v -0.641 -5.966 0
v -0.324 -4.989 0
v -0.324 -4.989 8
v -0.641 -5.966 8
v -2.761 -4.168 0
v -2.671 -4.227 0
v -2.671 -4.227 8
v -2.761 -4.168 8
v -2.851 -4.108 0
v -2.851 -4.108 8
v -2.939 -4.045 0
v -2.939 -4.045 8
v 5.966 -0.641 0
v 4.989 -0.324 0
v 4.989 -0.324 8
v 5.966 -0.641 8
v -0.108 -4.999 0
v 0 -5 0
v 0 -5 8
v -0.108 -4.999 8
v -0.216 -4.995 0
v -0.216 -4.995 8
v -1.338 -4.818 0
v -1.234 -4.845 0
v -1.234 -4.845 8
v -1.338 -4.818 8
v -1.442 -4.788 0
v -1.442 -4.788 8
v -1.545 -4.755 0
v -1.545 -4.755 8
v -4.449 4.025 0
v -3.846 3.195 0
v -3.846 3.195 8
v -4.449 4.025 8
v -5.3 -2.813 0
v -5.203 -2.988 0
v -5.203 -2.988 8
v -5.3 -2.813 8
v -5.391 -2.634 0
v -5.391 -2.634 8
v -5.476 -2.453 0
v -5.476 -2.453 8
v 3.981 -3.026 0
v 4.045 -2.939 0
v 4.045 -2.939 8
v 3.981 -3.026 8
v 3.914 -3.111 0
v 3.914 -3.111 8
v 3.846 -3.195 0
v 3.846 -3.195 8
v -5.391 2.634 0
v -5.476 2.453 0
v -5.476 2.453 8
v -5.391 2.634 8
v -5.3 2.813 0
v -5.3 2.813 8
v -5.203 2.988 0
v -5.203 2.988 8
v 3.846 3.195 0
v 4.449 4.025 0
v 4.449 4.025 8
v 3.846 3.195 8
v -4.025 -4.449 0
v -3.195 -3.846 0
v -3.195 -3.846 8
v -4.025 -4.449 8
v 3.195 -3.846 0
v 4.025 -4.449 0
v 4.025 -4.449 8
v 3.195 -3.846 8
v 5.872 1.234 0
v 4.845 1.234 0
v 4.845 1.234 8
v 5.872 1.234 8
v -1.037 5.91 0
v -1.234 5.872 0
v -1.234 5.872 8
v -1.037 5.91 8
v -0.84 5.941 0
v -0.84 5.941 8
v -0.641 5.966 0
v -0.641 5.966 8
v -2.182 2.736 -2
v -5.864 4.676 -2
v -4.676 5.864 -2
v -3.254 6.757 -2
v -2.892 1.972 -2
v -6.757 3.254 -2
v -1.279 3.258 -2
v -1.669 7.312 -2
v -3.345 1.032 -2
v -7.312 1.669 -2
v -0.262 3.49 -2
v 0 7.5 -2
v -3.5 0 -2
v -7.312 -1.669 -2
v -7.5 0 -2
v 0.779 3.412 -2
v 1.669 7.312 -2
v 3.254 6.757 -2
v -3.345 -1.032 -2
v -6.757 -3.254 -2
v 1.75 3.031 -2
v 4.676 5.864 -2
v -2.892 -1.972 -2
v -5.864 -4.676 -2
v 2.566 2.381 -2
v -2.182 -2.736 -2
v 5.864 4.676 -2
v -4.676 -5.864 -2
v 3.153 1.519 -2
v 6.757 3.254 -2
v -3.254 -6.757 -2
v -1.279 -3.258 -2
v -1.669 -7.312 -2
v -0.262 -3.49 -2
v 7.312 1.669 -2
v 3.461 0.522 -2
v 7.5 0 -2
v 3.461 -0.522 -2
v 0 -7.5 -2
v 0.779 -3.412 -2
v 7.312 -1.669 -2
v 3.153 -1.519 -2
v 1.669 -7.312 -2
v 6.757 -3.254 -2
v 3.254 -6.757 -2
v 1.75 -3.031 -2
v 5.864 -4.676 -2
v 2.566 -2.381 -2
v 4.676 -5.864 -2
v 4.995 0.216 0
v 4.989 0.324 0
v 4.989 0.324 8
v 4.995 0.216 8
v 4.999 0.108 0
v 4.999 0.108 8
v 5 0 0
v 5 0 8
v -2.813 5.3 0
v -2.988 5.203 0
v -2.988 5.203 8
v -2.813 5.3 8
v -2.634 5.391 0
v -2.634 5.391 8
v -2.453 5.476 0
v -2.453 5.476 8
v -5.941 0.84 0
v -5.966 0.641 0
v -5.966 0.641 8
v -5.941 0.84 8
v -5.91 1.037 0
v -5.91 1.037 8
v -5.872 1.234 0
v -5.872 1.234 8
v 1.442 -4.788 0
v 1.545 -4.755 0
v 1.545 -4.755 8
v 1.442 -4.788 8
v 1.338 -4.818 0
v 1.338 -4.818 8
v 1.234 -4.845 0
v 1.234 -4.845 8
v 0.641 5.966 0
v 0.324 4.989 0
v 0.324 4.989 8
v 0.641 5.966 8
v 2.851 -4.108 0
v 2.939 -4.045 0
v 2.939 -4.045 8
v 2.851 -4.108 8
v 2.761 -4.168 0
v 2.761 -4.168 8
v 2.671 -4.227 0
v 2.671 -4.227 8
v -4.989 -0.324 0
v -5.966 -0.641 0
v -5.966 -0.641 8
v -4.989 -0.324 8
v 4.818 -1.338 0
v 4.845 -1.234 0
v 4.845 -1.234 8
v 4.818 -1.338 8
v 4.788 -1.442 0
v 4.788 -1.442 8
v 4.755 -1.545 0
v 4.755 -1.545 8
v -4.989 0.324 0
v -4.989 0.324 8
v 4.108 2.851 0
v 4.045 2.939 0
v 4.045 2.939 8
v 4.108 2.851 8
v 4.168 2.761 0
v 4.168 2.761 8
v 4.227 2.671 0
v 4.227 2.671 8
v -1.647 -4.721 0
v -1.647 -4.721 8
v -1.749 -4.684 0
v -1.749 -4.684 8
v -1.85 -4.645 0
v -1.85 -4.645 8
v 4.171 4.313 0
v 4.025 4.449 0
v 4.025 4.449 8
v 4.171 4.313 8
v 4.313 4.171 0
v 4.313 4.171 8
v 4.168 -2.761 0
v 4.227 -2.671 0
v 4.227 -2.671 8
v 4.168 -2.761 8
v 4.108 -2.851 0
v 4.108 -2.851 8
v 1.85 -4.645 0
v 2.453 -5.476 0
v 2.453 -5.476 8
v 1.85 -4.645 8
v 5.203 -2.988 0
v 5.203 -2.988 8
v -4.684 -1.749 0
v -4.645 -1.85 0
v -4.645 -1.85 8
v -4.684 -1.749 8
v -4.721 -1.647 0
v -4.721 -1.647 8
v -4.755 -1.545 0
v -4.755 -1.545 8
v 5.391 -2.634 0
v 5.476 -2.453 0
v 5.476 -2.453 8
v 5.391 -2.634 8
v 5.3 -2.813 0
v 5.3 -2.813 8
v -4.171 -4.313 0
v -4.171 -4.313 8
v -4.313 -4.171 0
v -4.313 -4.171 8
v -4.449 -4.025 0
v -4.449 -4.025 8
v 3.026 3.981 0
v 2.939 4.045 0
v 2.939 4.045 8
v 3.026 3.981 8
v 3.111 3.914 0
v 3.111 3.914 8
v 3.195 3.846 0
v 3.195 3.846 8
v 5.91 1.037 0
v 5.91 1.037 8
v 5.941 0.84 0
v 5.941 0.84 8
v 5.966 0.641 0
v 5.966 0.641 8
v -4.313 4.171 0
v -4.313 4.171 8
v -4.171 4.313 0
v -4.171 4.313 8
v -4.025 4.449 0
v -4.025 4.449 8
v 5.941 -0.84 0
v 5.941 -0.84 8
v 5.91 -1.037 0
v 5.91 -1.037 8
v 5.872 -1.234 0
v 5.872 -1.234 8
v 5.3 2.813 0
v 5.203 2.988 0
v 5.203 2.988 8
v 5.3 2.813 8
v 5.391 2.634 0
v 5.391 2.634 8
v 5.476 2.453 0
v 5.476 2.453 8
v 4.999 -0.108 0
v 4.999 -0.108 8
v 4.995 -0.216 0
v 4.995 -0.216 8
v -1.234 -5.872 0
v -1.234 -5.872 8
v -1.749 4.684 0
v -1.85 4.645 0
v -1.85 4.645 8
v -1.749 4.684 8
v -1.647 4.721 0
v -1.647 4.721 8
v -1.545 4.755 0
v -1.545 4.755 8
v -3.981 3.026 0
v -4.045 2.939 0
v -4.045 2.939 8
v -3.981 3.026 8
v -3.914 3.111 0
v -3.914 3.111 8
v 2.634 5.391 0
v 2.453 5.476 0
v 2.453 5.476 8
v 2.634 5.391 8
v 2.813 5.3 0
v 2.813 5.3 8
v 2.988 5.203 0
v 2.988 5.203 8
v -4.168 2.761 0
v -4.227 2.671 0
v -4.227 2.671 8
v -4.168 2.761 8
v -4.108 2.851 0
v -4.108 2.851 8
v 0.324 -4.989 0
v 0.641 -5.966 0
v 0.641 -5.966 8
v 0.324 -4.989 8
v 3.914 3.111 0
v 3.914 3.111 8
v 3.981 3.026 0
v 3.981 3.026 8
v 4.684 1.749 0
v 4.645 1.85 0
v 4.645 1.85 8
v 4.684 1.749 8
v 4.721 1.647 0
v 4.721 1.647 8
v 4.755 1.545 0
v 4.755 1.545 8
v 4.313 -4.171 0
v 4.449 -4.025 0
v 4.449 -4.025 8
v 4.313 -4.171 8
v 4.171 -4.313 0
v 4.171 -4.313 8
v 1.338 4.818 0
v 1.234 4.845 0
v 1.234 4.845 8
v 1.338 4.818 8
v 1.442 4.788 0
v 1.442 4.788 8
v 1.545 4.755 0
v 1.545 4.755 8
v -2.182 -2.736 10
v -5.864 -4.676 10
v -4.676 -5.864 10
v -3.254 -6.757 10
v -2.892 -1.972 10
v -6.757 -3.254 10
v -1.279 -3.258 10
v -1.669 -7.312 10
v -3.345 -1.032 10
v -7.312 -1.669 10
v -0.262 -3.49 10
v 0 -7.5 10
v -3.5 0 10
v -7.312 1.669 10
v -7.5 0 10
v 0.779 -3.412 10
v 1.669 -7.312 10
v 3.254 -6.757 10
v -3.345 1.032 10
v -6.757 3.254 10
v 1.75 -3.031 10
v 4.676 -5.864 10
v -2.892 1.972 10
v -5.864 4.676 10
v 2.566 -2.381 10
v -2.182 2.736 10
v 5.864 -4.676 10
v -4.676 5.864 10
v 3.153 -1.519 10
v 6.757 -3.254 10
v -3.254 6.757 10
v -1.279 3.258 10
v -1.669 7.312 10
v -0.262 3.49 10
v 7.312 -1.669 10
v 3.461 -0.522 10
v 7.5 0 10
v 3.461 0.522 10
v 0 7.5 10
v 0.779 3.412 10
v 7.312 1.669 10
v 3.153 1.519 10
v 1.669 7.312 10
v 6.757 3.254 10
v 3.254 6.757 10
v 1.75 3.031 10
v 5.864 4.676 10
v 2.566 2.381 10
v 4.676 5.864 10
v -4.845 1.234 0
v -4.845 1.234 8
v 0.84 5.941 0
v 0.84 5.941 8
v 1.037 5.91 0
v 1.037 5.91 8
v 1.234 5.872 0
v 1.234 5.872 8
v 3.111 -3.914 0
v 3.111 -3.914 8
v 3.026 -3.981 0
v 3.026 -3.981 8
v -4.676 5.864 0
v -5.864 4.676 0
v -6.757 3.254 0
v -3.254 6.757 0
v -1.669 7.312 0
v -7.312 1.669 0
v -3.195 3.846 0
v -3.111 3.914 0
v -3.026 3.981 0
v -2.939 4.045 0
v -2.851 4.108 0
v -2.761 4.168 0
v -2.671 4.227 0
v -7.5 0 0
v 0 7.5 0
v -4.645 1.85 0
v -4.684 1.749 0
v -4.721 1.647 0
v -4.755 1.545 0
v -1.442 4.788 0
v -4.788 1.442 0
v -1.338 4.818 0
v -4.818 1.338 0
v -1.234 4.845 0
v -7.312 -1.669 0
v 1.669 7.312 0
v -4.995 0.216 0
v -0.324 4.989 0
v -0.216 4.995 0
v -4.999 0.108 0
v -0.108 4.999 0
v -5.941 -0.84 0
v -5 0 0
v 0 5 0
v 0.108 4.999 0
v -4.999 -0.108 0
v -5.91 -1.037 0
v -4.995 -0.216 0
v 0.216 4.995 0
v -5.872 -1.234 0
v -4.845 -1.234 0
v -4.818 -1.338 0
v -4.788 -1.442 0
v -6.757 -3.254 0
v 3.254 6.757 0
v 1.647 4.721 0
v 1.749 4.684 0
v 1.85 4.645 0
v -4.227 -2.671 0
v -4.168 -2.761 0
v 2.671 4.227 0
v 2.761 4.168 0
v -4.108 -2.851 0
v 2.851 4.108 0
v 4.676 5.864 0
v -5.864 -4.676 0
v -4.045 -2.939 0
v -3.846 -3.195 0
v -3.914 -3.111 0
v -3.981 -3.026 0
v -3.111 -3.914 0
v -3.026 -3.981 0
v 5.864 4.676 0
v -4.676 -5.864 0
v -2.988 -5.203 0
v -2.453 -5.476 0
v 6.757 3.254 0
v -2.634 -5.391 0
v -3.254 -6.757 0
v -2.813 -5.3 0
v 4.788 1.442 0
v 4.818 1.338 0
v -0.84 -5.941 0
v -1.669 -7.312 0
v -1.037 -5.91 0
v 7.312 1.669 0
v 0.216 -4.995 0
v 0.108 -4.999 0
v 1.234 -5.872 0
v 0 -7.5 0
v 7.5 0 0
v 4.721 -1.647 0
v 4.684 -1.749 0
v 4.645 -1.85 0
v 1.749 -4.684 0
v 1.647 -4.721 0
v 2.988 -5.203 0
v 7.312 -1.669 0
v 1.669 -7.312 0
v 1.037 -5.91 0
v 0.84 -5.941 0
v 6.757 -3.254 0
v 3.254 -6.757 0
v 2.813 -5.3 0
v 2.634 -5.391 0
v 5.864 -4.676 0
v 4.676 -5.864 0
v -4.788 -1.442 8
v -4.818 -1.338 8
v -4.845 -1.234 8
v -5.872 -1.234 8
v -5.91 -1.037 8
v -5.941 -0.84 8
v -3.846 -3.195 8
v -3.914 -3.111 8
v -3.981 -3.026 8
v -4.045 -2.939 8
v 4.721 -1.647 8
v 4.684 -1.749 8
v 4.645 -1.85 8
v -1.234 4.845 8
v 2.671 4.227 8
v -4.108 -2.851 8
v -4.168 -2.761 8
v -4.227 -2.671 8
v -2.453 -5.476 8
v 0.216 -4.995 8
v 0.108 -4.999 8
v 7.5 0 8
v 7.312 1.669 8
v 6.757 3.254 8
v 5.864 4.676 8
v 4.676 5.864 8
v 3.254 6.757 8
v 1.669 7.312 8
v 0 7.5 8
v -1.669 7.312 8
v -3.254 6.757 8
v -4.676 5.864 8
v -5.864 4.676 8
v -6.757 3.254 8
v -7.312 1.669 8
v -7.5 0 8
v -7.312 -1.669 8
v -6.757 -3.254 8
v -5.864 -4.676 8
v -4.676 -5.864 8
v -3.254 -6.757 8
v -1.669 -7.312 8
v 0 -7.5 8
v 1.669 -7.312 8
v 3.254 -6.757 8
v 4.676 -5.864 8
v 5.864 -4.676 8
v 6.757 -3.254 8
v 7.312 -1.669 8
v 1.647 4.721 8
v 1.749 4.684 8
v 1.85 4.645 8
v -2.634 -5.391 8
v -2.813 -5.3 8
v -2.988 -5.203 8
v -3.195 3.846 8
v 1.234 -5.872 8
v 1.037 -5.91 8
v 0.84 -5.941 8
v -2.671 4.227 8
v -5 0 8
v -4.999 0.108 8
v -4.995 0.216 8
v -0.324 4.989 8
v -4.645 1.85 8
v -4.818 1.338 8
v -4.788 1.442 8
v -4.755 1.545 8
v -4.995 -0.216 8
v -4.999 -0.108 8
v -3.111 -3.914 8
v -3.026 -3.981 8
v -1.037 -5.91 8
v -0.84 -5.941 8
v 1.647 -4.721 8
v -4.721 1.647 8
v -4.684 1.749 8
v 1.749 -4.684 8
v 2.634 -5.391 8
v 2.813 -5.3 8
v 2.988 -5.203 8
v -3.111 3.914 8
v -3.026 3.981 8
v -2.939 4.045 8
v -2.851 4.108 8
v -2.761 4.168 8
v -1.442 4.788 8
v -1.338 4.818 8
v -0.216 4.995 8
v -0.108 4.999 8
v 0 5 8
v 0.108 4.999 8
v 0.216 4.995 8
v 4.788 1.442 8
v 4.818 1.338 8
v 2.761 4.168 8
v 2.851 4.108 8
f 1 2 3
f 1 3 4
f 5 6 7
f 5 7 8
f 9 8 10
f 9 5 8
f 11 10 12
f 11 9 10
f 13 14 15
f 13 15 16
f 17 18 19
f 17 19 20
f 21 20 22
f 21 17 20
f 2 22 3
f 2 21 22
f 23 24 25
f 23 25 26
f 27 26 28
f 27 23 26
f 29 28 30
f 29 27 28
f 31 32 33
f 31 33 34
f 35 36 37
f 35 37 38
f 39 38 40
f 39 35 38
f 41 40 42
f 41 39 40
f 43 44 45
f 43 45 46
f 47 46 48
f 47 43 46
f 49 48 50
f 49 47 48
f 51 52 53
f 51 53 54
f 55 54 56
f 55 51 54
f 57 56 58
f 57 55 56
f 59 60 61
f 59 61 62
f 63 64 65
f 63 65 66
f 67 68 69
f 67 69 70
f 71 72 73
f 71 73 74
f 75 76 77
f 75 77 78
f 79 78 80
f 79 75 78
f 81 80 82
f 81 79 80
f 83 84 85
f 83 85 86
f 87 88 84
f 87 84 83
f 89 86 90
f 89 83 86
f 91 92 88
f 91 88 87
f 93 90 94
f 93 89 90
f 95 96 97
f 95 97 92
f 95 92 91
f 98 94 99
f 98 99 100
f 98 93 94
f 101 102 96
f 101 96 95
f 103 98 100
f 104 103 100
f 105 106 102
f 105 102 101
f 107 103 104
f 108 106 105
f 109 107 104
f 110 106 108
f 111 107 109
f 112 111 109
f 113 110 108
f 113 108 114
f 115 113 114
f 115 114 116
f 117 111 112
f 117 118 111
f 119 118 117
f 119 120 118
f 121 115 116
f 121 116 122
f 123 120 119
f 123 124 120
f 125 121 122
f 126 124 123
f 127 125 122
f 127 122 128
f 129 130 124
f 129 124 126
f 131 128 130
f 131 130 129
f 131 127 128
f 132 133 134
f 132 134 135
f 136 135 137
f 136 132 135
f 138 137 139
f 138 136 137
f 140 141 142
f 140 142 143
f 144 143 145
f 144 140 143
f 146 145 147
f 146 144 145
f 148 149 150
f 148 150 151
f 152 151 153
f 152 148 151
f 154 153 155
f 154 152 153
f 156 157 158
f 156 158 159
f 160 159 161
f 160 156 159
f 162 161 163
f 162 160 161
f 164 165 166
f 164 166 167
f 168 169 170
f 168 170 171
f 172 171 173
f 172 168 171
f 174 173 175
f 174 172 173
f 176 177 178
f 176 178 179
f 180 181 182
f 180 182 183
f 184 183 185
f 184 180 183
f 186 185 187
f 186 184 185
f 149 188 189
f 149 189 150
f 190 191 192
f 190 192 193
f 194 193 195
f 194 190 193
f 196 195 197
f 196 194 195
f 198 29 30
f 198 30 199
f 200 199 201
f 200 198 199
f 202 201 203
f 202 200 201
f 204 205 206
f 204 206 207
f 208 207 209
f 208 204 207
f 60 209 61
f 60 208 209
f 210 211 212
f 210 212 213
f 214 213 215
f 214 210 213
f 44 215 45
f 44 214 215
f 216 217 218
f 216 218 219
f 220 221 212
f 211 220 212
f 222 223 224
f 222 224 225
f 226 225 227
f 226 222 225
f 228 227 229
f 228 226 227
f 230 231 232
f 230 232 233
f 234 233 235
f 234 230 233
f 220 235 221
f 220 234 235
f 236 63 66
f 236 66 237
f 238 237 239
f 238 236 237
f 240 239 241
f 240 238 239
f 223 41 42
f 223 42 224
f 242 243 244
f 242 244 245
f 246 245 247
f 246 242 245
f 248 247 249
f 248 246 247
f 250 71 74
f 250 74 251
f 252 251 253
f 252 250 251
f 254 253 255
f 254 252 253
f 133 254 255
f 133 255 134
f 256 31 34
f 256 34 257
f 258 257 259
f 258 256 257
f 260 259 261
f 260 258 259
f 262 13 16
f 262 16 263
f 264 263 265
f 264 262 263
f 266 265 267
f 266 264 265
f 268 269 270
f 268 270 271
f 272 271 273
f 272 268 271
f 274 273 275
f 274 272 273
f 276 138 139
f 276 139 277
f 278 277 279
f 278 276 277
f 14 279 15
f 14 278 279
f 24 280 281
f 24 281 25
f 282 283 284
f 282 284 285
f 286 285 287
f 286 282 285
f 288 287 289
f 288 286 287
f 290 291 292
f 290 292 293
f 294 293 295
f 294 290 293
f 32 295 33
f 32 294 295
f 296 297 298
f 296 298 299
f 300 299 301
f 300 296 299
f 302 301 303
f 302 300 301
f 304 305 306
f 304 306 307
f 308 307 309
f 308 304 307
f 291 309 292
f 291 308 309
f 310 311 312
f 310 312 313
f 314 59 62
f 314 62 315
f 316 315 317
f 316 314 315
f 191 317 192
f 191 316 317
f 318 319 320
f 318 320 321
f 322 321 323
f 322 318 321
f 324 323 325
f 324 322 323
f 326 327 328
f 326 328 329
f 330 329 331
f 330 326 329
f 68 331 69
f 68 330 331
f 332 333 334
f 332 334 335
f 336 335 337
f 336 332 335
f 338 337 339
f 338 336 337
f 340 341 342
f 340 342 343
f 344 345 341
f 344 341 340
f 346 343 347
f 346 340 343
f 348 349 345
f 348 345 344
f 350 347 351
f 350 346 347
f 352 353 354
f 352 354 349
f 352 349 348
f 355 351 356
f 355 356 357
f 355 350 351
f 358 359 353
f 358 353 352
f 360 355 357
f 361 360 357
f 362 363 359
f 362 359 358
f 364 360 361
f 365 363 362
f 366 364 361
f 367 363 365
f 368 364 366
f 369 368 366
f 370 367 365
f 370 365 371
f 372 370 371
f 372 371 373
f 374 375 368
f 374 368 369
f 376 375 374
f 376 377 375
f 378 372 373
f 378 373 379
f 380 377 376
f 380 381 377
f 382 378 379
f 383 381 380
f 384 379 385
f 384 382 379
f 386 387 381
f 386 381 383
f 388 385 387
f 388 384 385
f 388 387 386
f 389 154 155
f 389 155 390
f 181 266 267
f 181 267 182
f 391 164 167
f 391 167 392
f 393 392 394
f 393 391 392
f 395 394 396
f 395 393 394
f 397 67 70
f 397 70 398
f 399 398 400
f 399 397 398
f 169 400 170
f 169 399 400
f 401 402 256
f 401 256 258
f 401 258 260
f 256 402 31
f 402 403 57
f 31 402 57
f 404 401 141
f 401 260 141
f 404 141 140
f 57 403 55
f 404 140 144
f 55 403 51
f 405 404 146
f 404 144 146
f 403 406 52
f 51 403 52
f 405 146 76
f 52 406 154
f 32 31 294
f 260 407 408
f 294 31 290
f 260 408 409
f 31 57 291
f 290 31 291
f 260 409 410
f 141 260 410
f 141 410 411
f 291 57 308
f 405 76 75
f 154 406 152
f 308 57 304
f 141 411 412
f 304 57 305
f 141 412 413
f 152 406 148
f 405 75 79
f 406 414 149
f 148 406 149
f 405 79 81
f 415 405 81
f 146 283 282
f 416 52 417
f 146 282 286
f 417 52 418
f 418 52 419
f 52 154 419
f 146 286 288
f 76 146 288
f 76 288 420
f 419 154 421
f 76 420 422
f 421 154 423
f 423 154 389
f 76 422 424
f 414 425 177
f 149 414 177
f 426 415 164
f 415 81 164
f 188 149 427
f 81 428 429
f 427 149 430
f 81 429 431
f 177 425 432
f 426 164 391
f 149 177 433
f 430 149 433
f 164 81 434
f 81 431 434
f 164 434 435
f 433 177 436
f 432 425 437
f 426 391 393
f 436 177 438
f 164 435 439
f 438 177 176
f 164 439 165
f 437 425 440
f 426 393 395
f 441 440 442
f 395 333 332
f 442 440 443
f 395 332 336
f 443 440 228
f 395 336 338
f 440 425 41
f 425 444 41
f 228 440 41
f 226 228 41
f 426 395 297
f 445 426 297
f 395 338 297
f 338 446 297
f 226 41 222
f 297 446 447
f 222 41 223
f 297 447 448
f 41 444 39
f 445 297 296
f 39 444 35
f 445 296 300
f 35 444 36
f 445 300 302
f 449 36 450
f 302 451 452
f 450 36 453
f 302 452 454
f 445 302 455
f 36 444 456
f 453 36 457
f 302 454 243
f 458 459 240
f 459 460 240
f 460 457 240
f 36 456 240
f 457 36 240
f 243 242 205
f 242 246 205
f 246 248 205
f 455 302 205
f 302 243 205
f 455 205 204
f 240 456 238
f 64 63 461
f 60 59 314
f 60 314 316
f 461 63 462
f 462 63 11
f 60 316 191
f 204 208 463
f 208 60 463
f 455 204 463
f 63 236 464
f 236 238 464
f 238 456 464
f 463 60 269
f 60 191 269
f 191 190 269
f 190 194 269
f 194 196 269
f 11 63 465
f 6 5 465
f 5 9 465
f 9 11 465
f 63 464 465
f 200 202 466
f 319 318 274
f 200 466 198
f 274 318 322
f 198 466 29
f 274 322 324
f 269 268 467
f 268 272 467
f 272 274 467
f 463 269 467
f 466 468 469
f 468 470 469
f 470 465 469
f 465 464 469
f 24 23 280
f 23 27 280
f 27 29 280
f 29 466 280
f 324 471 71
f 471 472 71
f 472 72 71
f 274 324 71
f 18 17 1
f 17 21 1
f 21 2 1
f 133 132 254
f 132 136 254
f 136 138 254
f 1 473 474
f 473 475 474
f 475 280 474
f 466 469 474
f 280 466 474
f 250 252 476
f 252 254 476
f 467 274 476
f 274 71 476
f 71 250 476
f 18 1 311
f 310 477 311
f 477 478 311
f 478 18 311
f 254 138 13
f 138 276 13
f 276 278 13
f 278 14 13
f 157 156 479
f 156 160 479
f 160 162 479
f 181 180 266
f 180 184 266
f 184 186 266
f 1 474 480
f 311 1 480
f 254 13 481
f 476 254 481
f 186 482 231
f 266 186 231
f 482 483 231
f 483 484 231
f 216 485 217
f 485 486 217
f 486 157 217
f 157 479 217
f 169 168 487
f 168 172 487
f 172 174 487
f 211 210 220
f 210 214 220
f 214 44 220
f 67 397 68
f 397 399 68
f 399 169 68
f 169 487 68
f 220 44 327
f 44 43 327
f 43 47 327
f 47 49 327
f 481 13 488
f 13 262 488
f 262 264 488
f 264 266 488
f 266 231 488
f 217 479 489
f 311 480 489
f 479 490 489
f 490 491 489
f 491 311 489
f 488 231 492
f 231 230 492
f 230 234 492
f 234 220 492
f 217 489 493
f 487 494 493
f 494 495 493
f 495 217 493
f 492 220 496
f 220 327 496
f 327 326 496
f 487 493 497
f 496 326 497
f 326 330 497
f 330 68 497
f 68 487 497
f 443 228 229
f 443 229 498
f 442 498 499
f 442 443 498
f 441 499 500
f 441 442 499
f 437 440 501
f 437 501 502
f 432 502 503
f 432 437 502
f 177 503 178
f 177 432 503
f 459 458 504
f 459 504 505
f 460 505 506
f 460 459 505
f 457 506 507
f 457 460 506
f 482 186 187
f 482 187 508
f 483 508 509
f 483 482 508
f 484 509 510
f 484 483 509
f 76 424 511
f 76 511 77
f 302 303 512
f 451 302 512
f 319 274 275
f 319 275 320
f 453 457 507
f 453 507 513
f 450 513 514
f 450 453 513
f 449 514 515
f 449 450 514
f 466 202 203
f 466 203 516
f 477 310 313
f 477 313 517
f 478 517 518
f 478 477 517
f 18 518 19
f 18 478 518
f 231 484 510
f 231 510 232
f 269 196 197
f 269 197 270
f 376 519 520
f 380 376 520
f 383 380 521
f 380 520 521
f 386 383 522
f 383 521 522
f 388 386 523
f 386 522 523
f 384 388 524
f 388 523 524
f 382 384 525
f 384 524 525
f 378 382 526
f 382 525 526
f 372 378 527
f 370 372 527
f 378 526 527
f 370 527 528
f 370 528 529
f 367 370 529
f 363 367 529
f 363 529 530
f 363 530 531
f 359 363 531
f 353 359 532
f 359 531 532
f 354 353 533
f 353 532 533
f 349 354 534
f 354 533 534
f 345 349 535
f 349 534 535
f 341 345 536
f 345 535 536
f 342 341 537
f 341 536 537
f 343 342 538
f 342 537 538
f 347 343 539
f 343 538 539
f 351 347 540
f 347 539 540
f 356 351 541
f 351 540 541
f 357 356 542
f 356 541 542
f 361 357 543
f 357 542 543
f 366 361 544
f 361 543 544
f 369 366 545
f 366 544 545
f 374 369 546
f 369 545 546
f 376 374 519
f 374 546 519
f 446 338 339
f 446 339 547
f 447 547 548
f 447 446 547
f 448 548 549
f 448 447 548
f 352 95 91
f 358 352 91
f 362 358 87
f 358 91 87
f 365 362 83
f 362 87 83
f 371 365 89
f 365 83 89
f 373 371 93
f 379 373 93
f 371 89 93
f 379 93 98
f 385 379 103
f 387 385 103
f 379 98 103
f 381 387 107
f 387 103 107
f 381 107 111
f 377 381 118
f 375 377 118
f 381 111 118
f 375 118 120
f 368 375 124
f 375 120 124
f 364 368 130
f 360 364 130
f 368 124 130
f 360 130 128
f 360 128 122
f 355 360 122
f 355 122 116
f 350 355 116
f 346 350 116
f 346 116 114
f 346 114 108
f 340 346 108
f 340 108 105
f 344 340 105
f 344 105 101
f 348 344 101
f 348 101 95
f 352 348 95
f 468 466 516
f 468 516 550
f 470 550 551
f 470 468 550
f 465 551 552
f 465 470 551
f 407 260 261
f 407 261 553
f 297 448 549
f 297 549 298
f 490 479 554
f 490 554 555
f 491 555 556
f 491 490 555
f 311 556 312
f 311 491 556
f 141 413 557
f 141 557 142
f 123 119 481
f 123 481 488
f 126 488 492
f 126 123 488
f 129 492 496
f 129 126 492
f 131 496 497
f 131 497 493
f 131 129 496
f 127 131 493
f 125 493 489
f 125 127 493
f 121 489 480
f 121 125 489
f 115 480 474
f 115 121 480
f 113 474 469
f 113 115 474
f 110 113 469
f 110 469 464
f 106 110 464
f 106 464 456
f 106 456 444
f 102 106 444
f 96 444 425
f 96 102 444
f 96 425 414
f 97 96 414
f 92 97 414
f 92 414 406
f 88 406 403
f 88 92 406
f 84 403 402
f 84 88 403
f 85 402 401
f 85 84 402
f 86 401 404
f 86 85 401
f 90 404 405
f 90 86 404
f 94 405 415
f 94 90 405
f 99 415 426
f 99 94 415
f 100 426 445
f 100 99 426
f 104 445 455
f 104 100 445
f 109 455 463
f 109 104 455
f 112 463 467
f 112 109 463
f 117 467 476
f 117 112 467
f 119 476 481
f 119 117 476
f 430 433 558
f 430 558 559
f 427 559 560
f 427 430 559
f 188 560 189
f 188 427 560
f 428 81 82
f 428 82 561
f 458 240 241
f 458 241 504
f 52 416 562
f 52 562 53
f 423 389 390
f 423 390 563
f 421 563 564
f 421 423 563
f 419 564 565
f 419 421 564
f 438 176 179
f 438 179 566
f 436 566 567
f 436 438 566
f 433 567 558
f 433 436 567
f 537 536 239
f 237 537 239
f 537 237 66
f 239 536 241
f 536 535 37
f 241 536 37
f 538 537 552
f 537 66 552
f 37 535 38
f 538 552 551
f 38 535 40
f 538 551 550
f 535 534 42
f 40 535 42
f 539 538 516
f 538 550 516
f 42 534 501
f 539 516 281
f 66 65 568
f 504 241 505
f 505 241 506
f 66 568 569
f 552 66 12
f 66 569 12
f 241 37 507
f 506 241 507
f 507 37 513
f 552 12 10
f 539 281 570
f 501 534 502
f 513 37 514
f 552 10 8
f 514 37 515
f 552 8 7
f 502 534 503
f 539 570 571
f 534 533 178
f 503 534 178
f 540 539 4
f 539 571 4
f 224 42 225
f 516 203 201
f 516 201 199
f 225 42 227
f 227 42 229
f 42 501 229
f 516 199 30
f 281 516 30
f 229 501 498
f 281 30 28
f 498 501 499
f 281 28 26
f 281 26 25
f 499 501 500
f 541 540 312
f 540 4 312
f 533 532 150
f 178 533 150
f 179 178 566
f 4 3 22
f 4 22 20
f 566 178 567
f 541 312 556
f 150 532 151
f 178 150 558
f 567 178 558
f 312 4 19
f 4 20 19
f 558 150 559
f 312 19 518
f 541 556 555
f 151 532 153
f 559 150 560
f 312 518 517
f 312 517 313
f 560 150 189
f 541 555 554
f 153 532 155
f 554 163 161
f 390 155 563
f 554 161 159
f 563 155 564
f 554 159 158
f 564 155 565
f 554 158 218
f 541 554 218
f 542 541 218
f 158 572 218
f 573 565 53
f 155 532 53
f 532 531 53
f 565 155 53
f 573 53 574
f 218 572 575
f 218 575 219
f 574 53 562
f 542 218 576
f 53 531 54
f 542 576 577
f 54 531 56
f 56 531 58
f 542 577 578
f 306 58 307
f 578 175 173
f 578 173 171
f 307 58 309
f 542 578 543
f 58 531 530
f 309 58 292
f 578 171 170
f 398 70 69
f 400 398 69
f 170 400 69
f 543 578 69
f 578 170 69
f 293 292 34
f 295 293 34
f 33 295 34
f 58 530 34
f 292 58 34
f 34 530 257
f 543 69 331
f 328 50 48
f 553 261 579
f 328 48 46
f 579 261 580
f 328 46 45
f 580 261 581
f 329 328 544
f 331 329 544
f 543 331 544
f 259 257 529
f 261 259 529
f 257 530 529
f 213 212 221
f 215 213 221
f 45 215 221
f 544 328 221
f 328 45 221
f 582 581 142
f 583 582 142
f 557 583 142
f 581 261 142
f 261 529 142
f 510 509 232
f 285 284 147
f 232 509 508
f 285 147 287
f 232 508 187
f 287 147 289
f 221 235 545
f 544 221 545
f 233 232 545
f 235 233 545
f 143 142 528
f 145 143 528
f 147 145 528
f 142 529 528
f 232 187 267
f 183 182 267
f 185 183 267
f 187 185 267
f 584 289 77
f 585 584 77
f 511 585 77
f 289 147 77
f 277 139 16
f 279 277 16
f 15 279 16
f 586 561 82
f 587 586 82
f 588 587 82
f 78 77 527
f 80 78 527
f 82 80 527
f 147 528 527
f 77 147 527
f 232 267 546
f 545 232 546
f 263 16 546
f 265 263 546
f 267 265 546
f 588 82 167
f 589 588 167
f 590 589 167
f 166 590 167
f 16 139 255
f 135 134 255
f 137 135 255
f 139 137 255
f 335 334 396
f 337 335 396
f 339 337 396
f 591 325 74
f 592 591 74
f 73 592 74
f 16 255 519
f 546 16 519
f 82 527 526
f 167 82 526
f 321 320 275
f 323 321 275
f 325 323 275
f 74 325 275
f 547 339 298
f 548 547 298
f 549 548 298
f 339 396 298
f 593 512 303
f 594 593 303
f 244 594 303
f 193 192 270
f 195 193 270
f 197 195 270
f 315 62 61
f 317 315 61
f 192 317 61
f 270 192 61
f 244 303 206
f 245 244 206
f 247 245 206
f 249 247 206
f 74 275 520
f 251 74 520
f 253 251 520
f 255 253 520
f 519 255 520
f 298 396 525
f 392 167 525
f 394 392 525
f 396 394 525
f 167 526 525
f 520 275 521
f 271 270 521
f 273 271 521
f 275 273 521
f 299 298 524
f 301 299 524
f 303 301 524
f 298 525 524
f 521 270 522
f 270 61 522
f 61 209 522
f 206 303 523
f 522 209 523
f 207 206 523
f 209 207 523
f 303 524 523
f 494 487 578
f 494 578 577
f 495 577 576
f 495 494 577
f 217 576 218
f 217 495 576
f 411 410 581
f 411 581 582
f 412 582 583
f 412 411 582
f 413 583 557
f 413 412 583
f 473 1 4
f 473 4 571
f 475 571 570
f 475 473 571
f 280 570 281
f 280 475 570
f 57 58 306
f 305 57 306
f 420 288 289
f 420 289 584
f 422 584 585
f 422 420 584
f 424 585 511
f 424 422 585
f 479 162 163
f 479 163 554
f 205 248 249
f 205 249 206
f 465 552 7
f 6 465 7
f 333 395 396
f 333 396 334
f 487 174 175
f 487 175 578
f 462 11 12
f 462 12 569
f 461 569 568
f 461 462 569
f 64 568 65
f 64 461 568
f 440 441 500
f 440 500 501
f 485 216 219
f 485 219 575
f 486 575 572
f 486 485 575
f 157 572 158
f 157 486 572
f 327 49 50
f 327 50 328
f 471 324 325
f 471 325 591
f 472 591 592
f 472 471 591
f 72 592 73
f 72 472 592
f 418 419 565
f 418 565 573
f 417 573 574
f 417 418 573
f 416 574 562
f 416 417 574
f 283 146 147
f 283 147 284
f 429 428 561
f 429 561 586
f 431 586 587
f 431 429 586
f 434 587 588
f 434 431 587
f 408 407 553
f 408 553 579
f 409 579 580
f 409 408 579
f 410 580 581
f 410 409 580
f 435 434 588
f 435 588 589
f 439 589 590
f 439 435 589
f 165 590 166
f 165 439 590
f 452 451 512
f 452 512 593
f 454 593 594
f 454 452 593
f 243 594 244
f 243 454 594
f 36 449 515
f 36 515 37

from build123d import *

# Parameters (mm, degrees)
BOSS_EXTRUDE1_DEPTH = 8
SKETCH3_R           = 7.5
BOSS_EXTRUDE2_DEPTH = 2
BOSS_EXTRUDE3_START = 2
SKETCH4_R           = 7.5
BOSS_EXTRUDE3_DEPTH = 2
SKETCH5_R           = 3.5
CUT_EXTRUDE1_DEPTH  = 17.015617378


with BuildPart() as part:
    # Sketch2 → Boss-Extrude1 (new body)
    with BuildSketch(Plane.XY):
        with BuildLine():
            Line((0.323954703, 4.989494298), (0.641126295, 5.965648085))
            ThreePointArc((0.641126295, 5.965648085), (0.93860679, 5.926130044), (1.2337393, 5.871787406))
            Line((1.2337393, 5.871787406), (1.2337393, 4.845398574))
            ThreePointArc((1.2337393, 4.845398574), (1.390142549, 4.802864114), (1.545084972, 4.755282581))
            ThreePointArc((1.545084972, 4.755282581), (1.698403748, 4.702703978), (1.849937763, 4.645183556))
            Line((1.849937763, 4.645183556), (2.453233982, 5.475549564))
            ThreePointArc((2.453233982, 5.475549564), (2.723942998, 5.346039145), (2.987837896, 5.203155264))
            Line((2.987837896, 5.203155264), (2.670666304, 4.227001478))
            ThreePointArc((2.670666304, 4.227001478), (2.806270762, 4.13821754), (2.938926261, 4.045084972))
            ThreePointArc((2.938926261, 4.045084972), (3.068493401, 3.947701641), (3.194836025, 3.846169883))
            Line((3.194836025, 3.846169883), (4.025202033, 4.449466102))
            ThreePointArc((4.025202033, 4.449466102), (4.242640687, 4.242640687), (4.449466102, 4.025202033))
            Line((4.449466102, 4.025202033), (3.846169883, 3.194836025))
            ThreePointArc((3.846169883, 3.194836025), (3.947701641, 3.068493401), (4.045084972, 2.938926261))
            ThreePointArc((4.045084972, 2.938926261), (4.13821754, 2.806270762), (4.227001478, 2.670666304))
            Line((4.227001478, 2.670666304), (5.203155264, 2.987837896))
            ThreePointArc((5.203155264, 2.987837896), (5.346039145, 2.723942998), (5.475549564, 2.453233982))
            Line((5.475549564, 2.453233982), (4.645183556, 1.849937763))
            ThreePointArc((4.645183556, 1.849937763), (4.702703978, 1.698403748), (4.755282581, 1.545084972))
            ThreePointArc((4.755282581, 1.545084972), (4.802864114, 1.390142549), (4.845398574, 1.2337393))
            Line((4.845398574, 1.2337393), (5.871787406, 1.2337393))
            ThreePointArc((5.871787406, 1.2337393), (5.926130044, 0.93860679), (5.965648085, 0.641126295))
            Line((5.965648085, 0.641126295), (4.989494298, 0.323954703))
            ThreePointArc((4.989494298, 0.323954703), (4.997372884, 0.162062503), (5, 0))
            ThreePointArc((5, 0), (4.997372884, -0.162062503), (4.989494298, -0.323954703))
            Line((4.989494298, -0.323954703), (5.965648085, -0.641126295))
            ThreePointArc((5.965648085, -0.641126295), (5.926130044, -0.93860679), (5.871787406, -1.2337393))
            Line((5.871787406, -1.2337393), (4.845398574, -1.2337393))
            ThreePointArc((4.845398574, -1.2337393), (4.802864114, -1.390142549), (4.755282581, -1.545084972))
            ThreePointArc((4.755282581, -1.545084972), (4.702703978, -1.698403748), (4.645183556, -1.849937763))
            Line((4.645183556, -1.849937763), (5.475549564, -2.453233982))
            ThreePointArc((5.475549564, -2.453233982), (5.346039145, -2.723942998), (5.203155264, -2.987837896))
            Line((5.203155264, -2.987837896), (4.227001478, -2.670666304))
            ThreePointArc((4.227001478, -2.670666304), (4.13821754, -2.806270762), (4.045084972, -2.938926261))
            ThreePointArc((4.045084972, -2.938926261), (3.947701641, -3.068493401), (3.846169883, -3.194836025))
            Line((3.846169883, -3.194836025), (4.449466102, -4.025202033))
            ThreePointArc((4.449466102, -4.025202033), (4.242640687, -4.242640687), (4.025202033, -4.449466102))
            Line((4.025202033, -4.449466102), (3.194836025, -3.846169883))
            ThreePointArc((3.194836025, -3.846169883), (3.068493401, -3.947701641), (2.938926261, -4.045084972))
            ThreePointArc((2.938926261, -4.045084972), (2.806270762, -4.13821754), (2.670666304, -4.227001478))
            Line((2.670666304, -4.227001478), (2.987837896, -5.203155264))
            ThreePointArc((2.987837896, -5.203155264), (2.723942998, -5.346039145), (2.453233982, -5.475549564))
            Line((2.453233982, -5.475549564), (1.849937763, -4.645183556))
            ThreePointArc((1.849937763, -4.645183556), (1.698403748, -4.702703978), (1.545084972, -4.755282581))
            ThreePointArc((1.545084972, -4.755282581), (1.390142549, -4.802864114), (1.2337393, -4.845398574))
            Line((1.2337393, -4.845398574), (1.2337393, -5.871787406))
            ThreePointArc((1.2337393, -5.871787406), (0.93860679, -5.926130044), (0.641126295, -5.965648085))
            Line((0.641126295, -5.965648085), (0.323954703, -4.989494298))
            ThreePointArc((0.323954703, -4.989494298), (0.162062503, -4.997372884), (0, -5))
            ThreePointArc((0, -5), (-0.162062503, -4.997372884), (-0.323954703, -4.989494298))
            Line((-0.323954703, -4.989494298), (-0.641126295, -5.965648085))
            ThreePointArc((-0.641126295, -5.965648085), (-0.93860679, -5.926130044), (-1.2337393, -5.871787406))
            Line((-1.2337393, -5.871787406), (-1.2337393, -4.845398574))
            ThreePointArc((-1.2337393, -4.845398574), (-1.390142549, -4.802864114), (-1.545084972, -4.755282581))
            ThreePointArc((-1.545084972, -4.755282581), (-1.698403748, -4.702703978), (-1.849937763, -4.645183556))
            Line((-1.849937763, -4.645183556), (-2.453233982, -5.475549564))
            ThreePointArc((-2.453233982, -5.475549564), (-2.723942998, -5.346039145), (-2.987837896, -5.203155264))
            Line((-2.987837896, -5.203155264), (-2.670666304, -4.227001478))
            ThreePointArc((-2.670666304, -4.227001478), (-2.806270762, -4.13821754), (-2.938926261, -4.045084972))
            ThreePointArc((-2.938926261, -4.045084972), (-3.068493401, -3.947701641), (-3.194836025, -3.846169883))
            Line((-3.194836025, -3.846169883), (-4.025202033, -4.449466102))
            ThreePointArc((-4.025202033, -4.449466102), (-4.242640687, -4.242640687), (-4.449466102, -4.025202033))
            Line((-4.449466102, -4.025202033), (-3.846169883, -3.194836025))
            ThreePointArc((-3.846169883, -3.194836025), (-3.947701641, -3.068493401), (-4.045084972, -2.938926261))
            ThreePointArc((-4.045084972, -2.938926261), (-4.13821754, -2.806270762), (-4.227001478, -2.670666304))
            Line((-4.227001478, -2.670666304), (-5.203155264, -2.987837896))
            ThreePointArc((-5.203155264, -2.987837896), (-5.346039145, -2.723942998), (-5.475549564, -2.453233982))
            Line((-5.475549564, -2.453233982), (-4.645183556, -1.849937763))
            ThreePointArc((-4.645183556, -1.849937763), (-4.702703978, -1.698403748), (-4.755282581, -1.545084972))
            ThreePointArc((-4.755282581, -1.545084972), (-4.802864114, -1.390142549), (-4.845398574, -1.2337393))
            Line((-4.845398574, -1.2337393), (-5.871787406, -1.2337393))
            ThreePointArc((-5.871787406, -1.2337393), (-5.926130044, -0.93860679), (-5.965648085, -0.641126295))
            Line((-5.965648085, -0.641126295), (-4.989494298, -0.323954703))
            ThreePointArc((-4.989494298, -0.323954703), (-4.997372884, -0.162062503), (-5, 0))
            ThreePointArc((-5, 0), (-4.997372884, 0.162062503), (-4.989494298, 0.323954703))
            Line((-4.989494298, 0.323954703), (-5.965648085, 0.641126295))
            ThreePointArc((-5.965648085, 0.641126295), (-5.926130044, 0.93860679), (-5.871787406, 1.2337393))
            Line((-5.871787406, 1.2337393), (-4.845398574, 1.2337393))
            ThreePointArc((-4.845398574, 1.2337393), (-4.802864114, 1.390142549), (-4.755282581, 1.545084972))
            ThreePointArc((-4.755282581, 1.545084972), (-4.702703978, 1.698403748), (-4.645183556, 1.849937763))
            Line((-4.645183556, 1.849937763), (-5.475549564, 2.453233982))
            ThreePointArc((-5.475549564, 2.453233982), (-5.346039145, 2.723942998), (-5.203155264, 2.987837896))
            Line((-5.203155264, 2.987837896), (-4.227001478, 2.670666304))
            ThreePointArc((-4.227001478, 2.670666304), (-4.13821754, 2.806270762), (-4.045084972, 2.938926261))
            ThreePointArc((-4.045084972, 2.938926261), (-3.947701641, 3.068493401), (-3.846169883, 3.194836025))
            Line((-3.846169883, 3.194836025), (-4.449466102, 4.025202033))
            ThreePointArc((-4.449466102, 4.025202033), (-4.242640687, 4.242640687), (-4.025202033, 4.449466102))
            Line((-4.025202033, 4.449466102), (-3.194836025, 3.846169883))
            ThreePointArc((-3.194836025, 3.846169883), (-3.068493401, 3.947701641), (-2.938926261, 4.045084972))
            ThreePointArc((-2.938926261, 4.045084972), (-2.806270762, 4.13821754), (-2.670666304, 4.227001478))
            Line((-2.670666304, 4.227001478), (-2.987837896, 5.203155264))
            ThreePointArc((-2.987837896, 5.203155264), (-2.723942998, 5.346039145), (-2.453233982, 5.475549564))
            Line((-2.453233982, 5.475549564), (-1.849937763, 4.645183556))
            ThreePointArc((-1.849937763, 4.645183556), (-1.698403748, 4.702703978), (-1.545084972, 4.755282581))
            ThreePointArc((-1.545084972, 4.755282581), (-1.390142549, 4.802864114), (-1.2337393, 4.845398574))
            Line((-1.2337393, 4.845398574), (-1.2337393, 5.871787406))
            ThreePointArc((-1.2337393, 5.871787406), (-0.93860679, 5.926130044), (-0.641126295, 5.965648085))
            Line((-0.641126295, 5.965648085), (-0.323954703, 4.989494298))
            ThreePointArc((-0.323954703, 4.989494298), (-0.162062503, 4.997372884), (0, 5))
            ThreePointArc((0, 5), (0.162062503, 4.997372884), (0.323954703, 4.989494298))
        make_face()
    extrude(amount=BOSS_EXTRUDE1_DEPTH)

    # Sketch3 → Boss-Extrude2 (add)
    with BuildSketch(Plane.XY.offset(8)):
        Circle(SKETCH3_R)
    extrude(amount=BOSS_EXTRUDE2_DEPTH)

    # Sketch4 → Boss-Extrude3 (add)
    with BuildSketch(Plane(origin=(0, 0, 0), x_dir=(-1, 0, 0), z_dir=(0, 0, -1)).offset(BOSS_EXTRUDE3_START)):
        with Locations(Location((0, 0, 0), (0, 0, 180))):
            Circle(SKETCH4_R)
    extrude(amount=-BOSS_EXTRUDE3_DEPTH)

    # Sketch5 → Cut-Extrude1 (cut, through all)
    with BuildSketch(Plane(origin=(0, 0, -2), x_dir=(-1, 0, 0), z_dir=(0, 0, -1))):
        Circle(SKETCH5_R)
    extrude(amount=-CUT_EXTRUDE1_DEPTH, mode=Mode.SUBTRACT)


solid = part.part
